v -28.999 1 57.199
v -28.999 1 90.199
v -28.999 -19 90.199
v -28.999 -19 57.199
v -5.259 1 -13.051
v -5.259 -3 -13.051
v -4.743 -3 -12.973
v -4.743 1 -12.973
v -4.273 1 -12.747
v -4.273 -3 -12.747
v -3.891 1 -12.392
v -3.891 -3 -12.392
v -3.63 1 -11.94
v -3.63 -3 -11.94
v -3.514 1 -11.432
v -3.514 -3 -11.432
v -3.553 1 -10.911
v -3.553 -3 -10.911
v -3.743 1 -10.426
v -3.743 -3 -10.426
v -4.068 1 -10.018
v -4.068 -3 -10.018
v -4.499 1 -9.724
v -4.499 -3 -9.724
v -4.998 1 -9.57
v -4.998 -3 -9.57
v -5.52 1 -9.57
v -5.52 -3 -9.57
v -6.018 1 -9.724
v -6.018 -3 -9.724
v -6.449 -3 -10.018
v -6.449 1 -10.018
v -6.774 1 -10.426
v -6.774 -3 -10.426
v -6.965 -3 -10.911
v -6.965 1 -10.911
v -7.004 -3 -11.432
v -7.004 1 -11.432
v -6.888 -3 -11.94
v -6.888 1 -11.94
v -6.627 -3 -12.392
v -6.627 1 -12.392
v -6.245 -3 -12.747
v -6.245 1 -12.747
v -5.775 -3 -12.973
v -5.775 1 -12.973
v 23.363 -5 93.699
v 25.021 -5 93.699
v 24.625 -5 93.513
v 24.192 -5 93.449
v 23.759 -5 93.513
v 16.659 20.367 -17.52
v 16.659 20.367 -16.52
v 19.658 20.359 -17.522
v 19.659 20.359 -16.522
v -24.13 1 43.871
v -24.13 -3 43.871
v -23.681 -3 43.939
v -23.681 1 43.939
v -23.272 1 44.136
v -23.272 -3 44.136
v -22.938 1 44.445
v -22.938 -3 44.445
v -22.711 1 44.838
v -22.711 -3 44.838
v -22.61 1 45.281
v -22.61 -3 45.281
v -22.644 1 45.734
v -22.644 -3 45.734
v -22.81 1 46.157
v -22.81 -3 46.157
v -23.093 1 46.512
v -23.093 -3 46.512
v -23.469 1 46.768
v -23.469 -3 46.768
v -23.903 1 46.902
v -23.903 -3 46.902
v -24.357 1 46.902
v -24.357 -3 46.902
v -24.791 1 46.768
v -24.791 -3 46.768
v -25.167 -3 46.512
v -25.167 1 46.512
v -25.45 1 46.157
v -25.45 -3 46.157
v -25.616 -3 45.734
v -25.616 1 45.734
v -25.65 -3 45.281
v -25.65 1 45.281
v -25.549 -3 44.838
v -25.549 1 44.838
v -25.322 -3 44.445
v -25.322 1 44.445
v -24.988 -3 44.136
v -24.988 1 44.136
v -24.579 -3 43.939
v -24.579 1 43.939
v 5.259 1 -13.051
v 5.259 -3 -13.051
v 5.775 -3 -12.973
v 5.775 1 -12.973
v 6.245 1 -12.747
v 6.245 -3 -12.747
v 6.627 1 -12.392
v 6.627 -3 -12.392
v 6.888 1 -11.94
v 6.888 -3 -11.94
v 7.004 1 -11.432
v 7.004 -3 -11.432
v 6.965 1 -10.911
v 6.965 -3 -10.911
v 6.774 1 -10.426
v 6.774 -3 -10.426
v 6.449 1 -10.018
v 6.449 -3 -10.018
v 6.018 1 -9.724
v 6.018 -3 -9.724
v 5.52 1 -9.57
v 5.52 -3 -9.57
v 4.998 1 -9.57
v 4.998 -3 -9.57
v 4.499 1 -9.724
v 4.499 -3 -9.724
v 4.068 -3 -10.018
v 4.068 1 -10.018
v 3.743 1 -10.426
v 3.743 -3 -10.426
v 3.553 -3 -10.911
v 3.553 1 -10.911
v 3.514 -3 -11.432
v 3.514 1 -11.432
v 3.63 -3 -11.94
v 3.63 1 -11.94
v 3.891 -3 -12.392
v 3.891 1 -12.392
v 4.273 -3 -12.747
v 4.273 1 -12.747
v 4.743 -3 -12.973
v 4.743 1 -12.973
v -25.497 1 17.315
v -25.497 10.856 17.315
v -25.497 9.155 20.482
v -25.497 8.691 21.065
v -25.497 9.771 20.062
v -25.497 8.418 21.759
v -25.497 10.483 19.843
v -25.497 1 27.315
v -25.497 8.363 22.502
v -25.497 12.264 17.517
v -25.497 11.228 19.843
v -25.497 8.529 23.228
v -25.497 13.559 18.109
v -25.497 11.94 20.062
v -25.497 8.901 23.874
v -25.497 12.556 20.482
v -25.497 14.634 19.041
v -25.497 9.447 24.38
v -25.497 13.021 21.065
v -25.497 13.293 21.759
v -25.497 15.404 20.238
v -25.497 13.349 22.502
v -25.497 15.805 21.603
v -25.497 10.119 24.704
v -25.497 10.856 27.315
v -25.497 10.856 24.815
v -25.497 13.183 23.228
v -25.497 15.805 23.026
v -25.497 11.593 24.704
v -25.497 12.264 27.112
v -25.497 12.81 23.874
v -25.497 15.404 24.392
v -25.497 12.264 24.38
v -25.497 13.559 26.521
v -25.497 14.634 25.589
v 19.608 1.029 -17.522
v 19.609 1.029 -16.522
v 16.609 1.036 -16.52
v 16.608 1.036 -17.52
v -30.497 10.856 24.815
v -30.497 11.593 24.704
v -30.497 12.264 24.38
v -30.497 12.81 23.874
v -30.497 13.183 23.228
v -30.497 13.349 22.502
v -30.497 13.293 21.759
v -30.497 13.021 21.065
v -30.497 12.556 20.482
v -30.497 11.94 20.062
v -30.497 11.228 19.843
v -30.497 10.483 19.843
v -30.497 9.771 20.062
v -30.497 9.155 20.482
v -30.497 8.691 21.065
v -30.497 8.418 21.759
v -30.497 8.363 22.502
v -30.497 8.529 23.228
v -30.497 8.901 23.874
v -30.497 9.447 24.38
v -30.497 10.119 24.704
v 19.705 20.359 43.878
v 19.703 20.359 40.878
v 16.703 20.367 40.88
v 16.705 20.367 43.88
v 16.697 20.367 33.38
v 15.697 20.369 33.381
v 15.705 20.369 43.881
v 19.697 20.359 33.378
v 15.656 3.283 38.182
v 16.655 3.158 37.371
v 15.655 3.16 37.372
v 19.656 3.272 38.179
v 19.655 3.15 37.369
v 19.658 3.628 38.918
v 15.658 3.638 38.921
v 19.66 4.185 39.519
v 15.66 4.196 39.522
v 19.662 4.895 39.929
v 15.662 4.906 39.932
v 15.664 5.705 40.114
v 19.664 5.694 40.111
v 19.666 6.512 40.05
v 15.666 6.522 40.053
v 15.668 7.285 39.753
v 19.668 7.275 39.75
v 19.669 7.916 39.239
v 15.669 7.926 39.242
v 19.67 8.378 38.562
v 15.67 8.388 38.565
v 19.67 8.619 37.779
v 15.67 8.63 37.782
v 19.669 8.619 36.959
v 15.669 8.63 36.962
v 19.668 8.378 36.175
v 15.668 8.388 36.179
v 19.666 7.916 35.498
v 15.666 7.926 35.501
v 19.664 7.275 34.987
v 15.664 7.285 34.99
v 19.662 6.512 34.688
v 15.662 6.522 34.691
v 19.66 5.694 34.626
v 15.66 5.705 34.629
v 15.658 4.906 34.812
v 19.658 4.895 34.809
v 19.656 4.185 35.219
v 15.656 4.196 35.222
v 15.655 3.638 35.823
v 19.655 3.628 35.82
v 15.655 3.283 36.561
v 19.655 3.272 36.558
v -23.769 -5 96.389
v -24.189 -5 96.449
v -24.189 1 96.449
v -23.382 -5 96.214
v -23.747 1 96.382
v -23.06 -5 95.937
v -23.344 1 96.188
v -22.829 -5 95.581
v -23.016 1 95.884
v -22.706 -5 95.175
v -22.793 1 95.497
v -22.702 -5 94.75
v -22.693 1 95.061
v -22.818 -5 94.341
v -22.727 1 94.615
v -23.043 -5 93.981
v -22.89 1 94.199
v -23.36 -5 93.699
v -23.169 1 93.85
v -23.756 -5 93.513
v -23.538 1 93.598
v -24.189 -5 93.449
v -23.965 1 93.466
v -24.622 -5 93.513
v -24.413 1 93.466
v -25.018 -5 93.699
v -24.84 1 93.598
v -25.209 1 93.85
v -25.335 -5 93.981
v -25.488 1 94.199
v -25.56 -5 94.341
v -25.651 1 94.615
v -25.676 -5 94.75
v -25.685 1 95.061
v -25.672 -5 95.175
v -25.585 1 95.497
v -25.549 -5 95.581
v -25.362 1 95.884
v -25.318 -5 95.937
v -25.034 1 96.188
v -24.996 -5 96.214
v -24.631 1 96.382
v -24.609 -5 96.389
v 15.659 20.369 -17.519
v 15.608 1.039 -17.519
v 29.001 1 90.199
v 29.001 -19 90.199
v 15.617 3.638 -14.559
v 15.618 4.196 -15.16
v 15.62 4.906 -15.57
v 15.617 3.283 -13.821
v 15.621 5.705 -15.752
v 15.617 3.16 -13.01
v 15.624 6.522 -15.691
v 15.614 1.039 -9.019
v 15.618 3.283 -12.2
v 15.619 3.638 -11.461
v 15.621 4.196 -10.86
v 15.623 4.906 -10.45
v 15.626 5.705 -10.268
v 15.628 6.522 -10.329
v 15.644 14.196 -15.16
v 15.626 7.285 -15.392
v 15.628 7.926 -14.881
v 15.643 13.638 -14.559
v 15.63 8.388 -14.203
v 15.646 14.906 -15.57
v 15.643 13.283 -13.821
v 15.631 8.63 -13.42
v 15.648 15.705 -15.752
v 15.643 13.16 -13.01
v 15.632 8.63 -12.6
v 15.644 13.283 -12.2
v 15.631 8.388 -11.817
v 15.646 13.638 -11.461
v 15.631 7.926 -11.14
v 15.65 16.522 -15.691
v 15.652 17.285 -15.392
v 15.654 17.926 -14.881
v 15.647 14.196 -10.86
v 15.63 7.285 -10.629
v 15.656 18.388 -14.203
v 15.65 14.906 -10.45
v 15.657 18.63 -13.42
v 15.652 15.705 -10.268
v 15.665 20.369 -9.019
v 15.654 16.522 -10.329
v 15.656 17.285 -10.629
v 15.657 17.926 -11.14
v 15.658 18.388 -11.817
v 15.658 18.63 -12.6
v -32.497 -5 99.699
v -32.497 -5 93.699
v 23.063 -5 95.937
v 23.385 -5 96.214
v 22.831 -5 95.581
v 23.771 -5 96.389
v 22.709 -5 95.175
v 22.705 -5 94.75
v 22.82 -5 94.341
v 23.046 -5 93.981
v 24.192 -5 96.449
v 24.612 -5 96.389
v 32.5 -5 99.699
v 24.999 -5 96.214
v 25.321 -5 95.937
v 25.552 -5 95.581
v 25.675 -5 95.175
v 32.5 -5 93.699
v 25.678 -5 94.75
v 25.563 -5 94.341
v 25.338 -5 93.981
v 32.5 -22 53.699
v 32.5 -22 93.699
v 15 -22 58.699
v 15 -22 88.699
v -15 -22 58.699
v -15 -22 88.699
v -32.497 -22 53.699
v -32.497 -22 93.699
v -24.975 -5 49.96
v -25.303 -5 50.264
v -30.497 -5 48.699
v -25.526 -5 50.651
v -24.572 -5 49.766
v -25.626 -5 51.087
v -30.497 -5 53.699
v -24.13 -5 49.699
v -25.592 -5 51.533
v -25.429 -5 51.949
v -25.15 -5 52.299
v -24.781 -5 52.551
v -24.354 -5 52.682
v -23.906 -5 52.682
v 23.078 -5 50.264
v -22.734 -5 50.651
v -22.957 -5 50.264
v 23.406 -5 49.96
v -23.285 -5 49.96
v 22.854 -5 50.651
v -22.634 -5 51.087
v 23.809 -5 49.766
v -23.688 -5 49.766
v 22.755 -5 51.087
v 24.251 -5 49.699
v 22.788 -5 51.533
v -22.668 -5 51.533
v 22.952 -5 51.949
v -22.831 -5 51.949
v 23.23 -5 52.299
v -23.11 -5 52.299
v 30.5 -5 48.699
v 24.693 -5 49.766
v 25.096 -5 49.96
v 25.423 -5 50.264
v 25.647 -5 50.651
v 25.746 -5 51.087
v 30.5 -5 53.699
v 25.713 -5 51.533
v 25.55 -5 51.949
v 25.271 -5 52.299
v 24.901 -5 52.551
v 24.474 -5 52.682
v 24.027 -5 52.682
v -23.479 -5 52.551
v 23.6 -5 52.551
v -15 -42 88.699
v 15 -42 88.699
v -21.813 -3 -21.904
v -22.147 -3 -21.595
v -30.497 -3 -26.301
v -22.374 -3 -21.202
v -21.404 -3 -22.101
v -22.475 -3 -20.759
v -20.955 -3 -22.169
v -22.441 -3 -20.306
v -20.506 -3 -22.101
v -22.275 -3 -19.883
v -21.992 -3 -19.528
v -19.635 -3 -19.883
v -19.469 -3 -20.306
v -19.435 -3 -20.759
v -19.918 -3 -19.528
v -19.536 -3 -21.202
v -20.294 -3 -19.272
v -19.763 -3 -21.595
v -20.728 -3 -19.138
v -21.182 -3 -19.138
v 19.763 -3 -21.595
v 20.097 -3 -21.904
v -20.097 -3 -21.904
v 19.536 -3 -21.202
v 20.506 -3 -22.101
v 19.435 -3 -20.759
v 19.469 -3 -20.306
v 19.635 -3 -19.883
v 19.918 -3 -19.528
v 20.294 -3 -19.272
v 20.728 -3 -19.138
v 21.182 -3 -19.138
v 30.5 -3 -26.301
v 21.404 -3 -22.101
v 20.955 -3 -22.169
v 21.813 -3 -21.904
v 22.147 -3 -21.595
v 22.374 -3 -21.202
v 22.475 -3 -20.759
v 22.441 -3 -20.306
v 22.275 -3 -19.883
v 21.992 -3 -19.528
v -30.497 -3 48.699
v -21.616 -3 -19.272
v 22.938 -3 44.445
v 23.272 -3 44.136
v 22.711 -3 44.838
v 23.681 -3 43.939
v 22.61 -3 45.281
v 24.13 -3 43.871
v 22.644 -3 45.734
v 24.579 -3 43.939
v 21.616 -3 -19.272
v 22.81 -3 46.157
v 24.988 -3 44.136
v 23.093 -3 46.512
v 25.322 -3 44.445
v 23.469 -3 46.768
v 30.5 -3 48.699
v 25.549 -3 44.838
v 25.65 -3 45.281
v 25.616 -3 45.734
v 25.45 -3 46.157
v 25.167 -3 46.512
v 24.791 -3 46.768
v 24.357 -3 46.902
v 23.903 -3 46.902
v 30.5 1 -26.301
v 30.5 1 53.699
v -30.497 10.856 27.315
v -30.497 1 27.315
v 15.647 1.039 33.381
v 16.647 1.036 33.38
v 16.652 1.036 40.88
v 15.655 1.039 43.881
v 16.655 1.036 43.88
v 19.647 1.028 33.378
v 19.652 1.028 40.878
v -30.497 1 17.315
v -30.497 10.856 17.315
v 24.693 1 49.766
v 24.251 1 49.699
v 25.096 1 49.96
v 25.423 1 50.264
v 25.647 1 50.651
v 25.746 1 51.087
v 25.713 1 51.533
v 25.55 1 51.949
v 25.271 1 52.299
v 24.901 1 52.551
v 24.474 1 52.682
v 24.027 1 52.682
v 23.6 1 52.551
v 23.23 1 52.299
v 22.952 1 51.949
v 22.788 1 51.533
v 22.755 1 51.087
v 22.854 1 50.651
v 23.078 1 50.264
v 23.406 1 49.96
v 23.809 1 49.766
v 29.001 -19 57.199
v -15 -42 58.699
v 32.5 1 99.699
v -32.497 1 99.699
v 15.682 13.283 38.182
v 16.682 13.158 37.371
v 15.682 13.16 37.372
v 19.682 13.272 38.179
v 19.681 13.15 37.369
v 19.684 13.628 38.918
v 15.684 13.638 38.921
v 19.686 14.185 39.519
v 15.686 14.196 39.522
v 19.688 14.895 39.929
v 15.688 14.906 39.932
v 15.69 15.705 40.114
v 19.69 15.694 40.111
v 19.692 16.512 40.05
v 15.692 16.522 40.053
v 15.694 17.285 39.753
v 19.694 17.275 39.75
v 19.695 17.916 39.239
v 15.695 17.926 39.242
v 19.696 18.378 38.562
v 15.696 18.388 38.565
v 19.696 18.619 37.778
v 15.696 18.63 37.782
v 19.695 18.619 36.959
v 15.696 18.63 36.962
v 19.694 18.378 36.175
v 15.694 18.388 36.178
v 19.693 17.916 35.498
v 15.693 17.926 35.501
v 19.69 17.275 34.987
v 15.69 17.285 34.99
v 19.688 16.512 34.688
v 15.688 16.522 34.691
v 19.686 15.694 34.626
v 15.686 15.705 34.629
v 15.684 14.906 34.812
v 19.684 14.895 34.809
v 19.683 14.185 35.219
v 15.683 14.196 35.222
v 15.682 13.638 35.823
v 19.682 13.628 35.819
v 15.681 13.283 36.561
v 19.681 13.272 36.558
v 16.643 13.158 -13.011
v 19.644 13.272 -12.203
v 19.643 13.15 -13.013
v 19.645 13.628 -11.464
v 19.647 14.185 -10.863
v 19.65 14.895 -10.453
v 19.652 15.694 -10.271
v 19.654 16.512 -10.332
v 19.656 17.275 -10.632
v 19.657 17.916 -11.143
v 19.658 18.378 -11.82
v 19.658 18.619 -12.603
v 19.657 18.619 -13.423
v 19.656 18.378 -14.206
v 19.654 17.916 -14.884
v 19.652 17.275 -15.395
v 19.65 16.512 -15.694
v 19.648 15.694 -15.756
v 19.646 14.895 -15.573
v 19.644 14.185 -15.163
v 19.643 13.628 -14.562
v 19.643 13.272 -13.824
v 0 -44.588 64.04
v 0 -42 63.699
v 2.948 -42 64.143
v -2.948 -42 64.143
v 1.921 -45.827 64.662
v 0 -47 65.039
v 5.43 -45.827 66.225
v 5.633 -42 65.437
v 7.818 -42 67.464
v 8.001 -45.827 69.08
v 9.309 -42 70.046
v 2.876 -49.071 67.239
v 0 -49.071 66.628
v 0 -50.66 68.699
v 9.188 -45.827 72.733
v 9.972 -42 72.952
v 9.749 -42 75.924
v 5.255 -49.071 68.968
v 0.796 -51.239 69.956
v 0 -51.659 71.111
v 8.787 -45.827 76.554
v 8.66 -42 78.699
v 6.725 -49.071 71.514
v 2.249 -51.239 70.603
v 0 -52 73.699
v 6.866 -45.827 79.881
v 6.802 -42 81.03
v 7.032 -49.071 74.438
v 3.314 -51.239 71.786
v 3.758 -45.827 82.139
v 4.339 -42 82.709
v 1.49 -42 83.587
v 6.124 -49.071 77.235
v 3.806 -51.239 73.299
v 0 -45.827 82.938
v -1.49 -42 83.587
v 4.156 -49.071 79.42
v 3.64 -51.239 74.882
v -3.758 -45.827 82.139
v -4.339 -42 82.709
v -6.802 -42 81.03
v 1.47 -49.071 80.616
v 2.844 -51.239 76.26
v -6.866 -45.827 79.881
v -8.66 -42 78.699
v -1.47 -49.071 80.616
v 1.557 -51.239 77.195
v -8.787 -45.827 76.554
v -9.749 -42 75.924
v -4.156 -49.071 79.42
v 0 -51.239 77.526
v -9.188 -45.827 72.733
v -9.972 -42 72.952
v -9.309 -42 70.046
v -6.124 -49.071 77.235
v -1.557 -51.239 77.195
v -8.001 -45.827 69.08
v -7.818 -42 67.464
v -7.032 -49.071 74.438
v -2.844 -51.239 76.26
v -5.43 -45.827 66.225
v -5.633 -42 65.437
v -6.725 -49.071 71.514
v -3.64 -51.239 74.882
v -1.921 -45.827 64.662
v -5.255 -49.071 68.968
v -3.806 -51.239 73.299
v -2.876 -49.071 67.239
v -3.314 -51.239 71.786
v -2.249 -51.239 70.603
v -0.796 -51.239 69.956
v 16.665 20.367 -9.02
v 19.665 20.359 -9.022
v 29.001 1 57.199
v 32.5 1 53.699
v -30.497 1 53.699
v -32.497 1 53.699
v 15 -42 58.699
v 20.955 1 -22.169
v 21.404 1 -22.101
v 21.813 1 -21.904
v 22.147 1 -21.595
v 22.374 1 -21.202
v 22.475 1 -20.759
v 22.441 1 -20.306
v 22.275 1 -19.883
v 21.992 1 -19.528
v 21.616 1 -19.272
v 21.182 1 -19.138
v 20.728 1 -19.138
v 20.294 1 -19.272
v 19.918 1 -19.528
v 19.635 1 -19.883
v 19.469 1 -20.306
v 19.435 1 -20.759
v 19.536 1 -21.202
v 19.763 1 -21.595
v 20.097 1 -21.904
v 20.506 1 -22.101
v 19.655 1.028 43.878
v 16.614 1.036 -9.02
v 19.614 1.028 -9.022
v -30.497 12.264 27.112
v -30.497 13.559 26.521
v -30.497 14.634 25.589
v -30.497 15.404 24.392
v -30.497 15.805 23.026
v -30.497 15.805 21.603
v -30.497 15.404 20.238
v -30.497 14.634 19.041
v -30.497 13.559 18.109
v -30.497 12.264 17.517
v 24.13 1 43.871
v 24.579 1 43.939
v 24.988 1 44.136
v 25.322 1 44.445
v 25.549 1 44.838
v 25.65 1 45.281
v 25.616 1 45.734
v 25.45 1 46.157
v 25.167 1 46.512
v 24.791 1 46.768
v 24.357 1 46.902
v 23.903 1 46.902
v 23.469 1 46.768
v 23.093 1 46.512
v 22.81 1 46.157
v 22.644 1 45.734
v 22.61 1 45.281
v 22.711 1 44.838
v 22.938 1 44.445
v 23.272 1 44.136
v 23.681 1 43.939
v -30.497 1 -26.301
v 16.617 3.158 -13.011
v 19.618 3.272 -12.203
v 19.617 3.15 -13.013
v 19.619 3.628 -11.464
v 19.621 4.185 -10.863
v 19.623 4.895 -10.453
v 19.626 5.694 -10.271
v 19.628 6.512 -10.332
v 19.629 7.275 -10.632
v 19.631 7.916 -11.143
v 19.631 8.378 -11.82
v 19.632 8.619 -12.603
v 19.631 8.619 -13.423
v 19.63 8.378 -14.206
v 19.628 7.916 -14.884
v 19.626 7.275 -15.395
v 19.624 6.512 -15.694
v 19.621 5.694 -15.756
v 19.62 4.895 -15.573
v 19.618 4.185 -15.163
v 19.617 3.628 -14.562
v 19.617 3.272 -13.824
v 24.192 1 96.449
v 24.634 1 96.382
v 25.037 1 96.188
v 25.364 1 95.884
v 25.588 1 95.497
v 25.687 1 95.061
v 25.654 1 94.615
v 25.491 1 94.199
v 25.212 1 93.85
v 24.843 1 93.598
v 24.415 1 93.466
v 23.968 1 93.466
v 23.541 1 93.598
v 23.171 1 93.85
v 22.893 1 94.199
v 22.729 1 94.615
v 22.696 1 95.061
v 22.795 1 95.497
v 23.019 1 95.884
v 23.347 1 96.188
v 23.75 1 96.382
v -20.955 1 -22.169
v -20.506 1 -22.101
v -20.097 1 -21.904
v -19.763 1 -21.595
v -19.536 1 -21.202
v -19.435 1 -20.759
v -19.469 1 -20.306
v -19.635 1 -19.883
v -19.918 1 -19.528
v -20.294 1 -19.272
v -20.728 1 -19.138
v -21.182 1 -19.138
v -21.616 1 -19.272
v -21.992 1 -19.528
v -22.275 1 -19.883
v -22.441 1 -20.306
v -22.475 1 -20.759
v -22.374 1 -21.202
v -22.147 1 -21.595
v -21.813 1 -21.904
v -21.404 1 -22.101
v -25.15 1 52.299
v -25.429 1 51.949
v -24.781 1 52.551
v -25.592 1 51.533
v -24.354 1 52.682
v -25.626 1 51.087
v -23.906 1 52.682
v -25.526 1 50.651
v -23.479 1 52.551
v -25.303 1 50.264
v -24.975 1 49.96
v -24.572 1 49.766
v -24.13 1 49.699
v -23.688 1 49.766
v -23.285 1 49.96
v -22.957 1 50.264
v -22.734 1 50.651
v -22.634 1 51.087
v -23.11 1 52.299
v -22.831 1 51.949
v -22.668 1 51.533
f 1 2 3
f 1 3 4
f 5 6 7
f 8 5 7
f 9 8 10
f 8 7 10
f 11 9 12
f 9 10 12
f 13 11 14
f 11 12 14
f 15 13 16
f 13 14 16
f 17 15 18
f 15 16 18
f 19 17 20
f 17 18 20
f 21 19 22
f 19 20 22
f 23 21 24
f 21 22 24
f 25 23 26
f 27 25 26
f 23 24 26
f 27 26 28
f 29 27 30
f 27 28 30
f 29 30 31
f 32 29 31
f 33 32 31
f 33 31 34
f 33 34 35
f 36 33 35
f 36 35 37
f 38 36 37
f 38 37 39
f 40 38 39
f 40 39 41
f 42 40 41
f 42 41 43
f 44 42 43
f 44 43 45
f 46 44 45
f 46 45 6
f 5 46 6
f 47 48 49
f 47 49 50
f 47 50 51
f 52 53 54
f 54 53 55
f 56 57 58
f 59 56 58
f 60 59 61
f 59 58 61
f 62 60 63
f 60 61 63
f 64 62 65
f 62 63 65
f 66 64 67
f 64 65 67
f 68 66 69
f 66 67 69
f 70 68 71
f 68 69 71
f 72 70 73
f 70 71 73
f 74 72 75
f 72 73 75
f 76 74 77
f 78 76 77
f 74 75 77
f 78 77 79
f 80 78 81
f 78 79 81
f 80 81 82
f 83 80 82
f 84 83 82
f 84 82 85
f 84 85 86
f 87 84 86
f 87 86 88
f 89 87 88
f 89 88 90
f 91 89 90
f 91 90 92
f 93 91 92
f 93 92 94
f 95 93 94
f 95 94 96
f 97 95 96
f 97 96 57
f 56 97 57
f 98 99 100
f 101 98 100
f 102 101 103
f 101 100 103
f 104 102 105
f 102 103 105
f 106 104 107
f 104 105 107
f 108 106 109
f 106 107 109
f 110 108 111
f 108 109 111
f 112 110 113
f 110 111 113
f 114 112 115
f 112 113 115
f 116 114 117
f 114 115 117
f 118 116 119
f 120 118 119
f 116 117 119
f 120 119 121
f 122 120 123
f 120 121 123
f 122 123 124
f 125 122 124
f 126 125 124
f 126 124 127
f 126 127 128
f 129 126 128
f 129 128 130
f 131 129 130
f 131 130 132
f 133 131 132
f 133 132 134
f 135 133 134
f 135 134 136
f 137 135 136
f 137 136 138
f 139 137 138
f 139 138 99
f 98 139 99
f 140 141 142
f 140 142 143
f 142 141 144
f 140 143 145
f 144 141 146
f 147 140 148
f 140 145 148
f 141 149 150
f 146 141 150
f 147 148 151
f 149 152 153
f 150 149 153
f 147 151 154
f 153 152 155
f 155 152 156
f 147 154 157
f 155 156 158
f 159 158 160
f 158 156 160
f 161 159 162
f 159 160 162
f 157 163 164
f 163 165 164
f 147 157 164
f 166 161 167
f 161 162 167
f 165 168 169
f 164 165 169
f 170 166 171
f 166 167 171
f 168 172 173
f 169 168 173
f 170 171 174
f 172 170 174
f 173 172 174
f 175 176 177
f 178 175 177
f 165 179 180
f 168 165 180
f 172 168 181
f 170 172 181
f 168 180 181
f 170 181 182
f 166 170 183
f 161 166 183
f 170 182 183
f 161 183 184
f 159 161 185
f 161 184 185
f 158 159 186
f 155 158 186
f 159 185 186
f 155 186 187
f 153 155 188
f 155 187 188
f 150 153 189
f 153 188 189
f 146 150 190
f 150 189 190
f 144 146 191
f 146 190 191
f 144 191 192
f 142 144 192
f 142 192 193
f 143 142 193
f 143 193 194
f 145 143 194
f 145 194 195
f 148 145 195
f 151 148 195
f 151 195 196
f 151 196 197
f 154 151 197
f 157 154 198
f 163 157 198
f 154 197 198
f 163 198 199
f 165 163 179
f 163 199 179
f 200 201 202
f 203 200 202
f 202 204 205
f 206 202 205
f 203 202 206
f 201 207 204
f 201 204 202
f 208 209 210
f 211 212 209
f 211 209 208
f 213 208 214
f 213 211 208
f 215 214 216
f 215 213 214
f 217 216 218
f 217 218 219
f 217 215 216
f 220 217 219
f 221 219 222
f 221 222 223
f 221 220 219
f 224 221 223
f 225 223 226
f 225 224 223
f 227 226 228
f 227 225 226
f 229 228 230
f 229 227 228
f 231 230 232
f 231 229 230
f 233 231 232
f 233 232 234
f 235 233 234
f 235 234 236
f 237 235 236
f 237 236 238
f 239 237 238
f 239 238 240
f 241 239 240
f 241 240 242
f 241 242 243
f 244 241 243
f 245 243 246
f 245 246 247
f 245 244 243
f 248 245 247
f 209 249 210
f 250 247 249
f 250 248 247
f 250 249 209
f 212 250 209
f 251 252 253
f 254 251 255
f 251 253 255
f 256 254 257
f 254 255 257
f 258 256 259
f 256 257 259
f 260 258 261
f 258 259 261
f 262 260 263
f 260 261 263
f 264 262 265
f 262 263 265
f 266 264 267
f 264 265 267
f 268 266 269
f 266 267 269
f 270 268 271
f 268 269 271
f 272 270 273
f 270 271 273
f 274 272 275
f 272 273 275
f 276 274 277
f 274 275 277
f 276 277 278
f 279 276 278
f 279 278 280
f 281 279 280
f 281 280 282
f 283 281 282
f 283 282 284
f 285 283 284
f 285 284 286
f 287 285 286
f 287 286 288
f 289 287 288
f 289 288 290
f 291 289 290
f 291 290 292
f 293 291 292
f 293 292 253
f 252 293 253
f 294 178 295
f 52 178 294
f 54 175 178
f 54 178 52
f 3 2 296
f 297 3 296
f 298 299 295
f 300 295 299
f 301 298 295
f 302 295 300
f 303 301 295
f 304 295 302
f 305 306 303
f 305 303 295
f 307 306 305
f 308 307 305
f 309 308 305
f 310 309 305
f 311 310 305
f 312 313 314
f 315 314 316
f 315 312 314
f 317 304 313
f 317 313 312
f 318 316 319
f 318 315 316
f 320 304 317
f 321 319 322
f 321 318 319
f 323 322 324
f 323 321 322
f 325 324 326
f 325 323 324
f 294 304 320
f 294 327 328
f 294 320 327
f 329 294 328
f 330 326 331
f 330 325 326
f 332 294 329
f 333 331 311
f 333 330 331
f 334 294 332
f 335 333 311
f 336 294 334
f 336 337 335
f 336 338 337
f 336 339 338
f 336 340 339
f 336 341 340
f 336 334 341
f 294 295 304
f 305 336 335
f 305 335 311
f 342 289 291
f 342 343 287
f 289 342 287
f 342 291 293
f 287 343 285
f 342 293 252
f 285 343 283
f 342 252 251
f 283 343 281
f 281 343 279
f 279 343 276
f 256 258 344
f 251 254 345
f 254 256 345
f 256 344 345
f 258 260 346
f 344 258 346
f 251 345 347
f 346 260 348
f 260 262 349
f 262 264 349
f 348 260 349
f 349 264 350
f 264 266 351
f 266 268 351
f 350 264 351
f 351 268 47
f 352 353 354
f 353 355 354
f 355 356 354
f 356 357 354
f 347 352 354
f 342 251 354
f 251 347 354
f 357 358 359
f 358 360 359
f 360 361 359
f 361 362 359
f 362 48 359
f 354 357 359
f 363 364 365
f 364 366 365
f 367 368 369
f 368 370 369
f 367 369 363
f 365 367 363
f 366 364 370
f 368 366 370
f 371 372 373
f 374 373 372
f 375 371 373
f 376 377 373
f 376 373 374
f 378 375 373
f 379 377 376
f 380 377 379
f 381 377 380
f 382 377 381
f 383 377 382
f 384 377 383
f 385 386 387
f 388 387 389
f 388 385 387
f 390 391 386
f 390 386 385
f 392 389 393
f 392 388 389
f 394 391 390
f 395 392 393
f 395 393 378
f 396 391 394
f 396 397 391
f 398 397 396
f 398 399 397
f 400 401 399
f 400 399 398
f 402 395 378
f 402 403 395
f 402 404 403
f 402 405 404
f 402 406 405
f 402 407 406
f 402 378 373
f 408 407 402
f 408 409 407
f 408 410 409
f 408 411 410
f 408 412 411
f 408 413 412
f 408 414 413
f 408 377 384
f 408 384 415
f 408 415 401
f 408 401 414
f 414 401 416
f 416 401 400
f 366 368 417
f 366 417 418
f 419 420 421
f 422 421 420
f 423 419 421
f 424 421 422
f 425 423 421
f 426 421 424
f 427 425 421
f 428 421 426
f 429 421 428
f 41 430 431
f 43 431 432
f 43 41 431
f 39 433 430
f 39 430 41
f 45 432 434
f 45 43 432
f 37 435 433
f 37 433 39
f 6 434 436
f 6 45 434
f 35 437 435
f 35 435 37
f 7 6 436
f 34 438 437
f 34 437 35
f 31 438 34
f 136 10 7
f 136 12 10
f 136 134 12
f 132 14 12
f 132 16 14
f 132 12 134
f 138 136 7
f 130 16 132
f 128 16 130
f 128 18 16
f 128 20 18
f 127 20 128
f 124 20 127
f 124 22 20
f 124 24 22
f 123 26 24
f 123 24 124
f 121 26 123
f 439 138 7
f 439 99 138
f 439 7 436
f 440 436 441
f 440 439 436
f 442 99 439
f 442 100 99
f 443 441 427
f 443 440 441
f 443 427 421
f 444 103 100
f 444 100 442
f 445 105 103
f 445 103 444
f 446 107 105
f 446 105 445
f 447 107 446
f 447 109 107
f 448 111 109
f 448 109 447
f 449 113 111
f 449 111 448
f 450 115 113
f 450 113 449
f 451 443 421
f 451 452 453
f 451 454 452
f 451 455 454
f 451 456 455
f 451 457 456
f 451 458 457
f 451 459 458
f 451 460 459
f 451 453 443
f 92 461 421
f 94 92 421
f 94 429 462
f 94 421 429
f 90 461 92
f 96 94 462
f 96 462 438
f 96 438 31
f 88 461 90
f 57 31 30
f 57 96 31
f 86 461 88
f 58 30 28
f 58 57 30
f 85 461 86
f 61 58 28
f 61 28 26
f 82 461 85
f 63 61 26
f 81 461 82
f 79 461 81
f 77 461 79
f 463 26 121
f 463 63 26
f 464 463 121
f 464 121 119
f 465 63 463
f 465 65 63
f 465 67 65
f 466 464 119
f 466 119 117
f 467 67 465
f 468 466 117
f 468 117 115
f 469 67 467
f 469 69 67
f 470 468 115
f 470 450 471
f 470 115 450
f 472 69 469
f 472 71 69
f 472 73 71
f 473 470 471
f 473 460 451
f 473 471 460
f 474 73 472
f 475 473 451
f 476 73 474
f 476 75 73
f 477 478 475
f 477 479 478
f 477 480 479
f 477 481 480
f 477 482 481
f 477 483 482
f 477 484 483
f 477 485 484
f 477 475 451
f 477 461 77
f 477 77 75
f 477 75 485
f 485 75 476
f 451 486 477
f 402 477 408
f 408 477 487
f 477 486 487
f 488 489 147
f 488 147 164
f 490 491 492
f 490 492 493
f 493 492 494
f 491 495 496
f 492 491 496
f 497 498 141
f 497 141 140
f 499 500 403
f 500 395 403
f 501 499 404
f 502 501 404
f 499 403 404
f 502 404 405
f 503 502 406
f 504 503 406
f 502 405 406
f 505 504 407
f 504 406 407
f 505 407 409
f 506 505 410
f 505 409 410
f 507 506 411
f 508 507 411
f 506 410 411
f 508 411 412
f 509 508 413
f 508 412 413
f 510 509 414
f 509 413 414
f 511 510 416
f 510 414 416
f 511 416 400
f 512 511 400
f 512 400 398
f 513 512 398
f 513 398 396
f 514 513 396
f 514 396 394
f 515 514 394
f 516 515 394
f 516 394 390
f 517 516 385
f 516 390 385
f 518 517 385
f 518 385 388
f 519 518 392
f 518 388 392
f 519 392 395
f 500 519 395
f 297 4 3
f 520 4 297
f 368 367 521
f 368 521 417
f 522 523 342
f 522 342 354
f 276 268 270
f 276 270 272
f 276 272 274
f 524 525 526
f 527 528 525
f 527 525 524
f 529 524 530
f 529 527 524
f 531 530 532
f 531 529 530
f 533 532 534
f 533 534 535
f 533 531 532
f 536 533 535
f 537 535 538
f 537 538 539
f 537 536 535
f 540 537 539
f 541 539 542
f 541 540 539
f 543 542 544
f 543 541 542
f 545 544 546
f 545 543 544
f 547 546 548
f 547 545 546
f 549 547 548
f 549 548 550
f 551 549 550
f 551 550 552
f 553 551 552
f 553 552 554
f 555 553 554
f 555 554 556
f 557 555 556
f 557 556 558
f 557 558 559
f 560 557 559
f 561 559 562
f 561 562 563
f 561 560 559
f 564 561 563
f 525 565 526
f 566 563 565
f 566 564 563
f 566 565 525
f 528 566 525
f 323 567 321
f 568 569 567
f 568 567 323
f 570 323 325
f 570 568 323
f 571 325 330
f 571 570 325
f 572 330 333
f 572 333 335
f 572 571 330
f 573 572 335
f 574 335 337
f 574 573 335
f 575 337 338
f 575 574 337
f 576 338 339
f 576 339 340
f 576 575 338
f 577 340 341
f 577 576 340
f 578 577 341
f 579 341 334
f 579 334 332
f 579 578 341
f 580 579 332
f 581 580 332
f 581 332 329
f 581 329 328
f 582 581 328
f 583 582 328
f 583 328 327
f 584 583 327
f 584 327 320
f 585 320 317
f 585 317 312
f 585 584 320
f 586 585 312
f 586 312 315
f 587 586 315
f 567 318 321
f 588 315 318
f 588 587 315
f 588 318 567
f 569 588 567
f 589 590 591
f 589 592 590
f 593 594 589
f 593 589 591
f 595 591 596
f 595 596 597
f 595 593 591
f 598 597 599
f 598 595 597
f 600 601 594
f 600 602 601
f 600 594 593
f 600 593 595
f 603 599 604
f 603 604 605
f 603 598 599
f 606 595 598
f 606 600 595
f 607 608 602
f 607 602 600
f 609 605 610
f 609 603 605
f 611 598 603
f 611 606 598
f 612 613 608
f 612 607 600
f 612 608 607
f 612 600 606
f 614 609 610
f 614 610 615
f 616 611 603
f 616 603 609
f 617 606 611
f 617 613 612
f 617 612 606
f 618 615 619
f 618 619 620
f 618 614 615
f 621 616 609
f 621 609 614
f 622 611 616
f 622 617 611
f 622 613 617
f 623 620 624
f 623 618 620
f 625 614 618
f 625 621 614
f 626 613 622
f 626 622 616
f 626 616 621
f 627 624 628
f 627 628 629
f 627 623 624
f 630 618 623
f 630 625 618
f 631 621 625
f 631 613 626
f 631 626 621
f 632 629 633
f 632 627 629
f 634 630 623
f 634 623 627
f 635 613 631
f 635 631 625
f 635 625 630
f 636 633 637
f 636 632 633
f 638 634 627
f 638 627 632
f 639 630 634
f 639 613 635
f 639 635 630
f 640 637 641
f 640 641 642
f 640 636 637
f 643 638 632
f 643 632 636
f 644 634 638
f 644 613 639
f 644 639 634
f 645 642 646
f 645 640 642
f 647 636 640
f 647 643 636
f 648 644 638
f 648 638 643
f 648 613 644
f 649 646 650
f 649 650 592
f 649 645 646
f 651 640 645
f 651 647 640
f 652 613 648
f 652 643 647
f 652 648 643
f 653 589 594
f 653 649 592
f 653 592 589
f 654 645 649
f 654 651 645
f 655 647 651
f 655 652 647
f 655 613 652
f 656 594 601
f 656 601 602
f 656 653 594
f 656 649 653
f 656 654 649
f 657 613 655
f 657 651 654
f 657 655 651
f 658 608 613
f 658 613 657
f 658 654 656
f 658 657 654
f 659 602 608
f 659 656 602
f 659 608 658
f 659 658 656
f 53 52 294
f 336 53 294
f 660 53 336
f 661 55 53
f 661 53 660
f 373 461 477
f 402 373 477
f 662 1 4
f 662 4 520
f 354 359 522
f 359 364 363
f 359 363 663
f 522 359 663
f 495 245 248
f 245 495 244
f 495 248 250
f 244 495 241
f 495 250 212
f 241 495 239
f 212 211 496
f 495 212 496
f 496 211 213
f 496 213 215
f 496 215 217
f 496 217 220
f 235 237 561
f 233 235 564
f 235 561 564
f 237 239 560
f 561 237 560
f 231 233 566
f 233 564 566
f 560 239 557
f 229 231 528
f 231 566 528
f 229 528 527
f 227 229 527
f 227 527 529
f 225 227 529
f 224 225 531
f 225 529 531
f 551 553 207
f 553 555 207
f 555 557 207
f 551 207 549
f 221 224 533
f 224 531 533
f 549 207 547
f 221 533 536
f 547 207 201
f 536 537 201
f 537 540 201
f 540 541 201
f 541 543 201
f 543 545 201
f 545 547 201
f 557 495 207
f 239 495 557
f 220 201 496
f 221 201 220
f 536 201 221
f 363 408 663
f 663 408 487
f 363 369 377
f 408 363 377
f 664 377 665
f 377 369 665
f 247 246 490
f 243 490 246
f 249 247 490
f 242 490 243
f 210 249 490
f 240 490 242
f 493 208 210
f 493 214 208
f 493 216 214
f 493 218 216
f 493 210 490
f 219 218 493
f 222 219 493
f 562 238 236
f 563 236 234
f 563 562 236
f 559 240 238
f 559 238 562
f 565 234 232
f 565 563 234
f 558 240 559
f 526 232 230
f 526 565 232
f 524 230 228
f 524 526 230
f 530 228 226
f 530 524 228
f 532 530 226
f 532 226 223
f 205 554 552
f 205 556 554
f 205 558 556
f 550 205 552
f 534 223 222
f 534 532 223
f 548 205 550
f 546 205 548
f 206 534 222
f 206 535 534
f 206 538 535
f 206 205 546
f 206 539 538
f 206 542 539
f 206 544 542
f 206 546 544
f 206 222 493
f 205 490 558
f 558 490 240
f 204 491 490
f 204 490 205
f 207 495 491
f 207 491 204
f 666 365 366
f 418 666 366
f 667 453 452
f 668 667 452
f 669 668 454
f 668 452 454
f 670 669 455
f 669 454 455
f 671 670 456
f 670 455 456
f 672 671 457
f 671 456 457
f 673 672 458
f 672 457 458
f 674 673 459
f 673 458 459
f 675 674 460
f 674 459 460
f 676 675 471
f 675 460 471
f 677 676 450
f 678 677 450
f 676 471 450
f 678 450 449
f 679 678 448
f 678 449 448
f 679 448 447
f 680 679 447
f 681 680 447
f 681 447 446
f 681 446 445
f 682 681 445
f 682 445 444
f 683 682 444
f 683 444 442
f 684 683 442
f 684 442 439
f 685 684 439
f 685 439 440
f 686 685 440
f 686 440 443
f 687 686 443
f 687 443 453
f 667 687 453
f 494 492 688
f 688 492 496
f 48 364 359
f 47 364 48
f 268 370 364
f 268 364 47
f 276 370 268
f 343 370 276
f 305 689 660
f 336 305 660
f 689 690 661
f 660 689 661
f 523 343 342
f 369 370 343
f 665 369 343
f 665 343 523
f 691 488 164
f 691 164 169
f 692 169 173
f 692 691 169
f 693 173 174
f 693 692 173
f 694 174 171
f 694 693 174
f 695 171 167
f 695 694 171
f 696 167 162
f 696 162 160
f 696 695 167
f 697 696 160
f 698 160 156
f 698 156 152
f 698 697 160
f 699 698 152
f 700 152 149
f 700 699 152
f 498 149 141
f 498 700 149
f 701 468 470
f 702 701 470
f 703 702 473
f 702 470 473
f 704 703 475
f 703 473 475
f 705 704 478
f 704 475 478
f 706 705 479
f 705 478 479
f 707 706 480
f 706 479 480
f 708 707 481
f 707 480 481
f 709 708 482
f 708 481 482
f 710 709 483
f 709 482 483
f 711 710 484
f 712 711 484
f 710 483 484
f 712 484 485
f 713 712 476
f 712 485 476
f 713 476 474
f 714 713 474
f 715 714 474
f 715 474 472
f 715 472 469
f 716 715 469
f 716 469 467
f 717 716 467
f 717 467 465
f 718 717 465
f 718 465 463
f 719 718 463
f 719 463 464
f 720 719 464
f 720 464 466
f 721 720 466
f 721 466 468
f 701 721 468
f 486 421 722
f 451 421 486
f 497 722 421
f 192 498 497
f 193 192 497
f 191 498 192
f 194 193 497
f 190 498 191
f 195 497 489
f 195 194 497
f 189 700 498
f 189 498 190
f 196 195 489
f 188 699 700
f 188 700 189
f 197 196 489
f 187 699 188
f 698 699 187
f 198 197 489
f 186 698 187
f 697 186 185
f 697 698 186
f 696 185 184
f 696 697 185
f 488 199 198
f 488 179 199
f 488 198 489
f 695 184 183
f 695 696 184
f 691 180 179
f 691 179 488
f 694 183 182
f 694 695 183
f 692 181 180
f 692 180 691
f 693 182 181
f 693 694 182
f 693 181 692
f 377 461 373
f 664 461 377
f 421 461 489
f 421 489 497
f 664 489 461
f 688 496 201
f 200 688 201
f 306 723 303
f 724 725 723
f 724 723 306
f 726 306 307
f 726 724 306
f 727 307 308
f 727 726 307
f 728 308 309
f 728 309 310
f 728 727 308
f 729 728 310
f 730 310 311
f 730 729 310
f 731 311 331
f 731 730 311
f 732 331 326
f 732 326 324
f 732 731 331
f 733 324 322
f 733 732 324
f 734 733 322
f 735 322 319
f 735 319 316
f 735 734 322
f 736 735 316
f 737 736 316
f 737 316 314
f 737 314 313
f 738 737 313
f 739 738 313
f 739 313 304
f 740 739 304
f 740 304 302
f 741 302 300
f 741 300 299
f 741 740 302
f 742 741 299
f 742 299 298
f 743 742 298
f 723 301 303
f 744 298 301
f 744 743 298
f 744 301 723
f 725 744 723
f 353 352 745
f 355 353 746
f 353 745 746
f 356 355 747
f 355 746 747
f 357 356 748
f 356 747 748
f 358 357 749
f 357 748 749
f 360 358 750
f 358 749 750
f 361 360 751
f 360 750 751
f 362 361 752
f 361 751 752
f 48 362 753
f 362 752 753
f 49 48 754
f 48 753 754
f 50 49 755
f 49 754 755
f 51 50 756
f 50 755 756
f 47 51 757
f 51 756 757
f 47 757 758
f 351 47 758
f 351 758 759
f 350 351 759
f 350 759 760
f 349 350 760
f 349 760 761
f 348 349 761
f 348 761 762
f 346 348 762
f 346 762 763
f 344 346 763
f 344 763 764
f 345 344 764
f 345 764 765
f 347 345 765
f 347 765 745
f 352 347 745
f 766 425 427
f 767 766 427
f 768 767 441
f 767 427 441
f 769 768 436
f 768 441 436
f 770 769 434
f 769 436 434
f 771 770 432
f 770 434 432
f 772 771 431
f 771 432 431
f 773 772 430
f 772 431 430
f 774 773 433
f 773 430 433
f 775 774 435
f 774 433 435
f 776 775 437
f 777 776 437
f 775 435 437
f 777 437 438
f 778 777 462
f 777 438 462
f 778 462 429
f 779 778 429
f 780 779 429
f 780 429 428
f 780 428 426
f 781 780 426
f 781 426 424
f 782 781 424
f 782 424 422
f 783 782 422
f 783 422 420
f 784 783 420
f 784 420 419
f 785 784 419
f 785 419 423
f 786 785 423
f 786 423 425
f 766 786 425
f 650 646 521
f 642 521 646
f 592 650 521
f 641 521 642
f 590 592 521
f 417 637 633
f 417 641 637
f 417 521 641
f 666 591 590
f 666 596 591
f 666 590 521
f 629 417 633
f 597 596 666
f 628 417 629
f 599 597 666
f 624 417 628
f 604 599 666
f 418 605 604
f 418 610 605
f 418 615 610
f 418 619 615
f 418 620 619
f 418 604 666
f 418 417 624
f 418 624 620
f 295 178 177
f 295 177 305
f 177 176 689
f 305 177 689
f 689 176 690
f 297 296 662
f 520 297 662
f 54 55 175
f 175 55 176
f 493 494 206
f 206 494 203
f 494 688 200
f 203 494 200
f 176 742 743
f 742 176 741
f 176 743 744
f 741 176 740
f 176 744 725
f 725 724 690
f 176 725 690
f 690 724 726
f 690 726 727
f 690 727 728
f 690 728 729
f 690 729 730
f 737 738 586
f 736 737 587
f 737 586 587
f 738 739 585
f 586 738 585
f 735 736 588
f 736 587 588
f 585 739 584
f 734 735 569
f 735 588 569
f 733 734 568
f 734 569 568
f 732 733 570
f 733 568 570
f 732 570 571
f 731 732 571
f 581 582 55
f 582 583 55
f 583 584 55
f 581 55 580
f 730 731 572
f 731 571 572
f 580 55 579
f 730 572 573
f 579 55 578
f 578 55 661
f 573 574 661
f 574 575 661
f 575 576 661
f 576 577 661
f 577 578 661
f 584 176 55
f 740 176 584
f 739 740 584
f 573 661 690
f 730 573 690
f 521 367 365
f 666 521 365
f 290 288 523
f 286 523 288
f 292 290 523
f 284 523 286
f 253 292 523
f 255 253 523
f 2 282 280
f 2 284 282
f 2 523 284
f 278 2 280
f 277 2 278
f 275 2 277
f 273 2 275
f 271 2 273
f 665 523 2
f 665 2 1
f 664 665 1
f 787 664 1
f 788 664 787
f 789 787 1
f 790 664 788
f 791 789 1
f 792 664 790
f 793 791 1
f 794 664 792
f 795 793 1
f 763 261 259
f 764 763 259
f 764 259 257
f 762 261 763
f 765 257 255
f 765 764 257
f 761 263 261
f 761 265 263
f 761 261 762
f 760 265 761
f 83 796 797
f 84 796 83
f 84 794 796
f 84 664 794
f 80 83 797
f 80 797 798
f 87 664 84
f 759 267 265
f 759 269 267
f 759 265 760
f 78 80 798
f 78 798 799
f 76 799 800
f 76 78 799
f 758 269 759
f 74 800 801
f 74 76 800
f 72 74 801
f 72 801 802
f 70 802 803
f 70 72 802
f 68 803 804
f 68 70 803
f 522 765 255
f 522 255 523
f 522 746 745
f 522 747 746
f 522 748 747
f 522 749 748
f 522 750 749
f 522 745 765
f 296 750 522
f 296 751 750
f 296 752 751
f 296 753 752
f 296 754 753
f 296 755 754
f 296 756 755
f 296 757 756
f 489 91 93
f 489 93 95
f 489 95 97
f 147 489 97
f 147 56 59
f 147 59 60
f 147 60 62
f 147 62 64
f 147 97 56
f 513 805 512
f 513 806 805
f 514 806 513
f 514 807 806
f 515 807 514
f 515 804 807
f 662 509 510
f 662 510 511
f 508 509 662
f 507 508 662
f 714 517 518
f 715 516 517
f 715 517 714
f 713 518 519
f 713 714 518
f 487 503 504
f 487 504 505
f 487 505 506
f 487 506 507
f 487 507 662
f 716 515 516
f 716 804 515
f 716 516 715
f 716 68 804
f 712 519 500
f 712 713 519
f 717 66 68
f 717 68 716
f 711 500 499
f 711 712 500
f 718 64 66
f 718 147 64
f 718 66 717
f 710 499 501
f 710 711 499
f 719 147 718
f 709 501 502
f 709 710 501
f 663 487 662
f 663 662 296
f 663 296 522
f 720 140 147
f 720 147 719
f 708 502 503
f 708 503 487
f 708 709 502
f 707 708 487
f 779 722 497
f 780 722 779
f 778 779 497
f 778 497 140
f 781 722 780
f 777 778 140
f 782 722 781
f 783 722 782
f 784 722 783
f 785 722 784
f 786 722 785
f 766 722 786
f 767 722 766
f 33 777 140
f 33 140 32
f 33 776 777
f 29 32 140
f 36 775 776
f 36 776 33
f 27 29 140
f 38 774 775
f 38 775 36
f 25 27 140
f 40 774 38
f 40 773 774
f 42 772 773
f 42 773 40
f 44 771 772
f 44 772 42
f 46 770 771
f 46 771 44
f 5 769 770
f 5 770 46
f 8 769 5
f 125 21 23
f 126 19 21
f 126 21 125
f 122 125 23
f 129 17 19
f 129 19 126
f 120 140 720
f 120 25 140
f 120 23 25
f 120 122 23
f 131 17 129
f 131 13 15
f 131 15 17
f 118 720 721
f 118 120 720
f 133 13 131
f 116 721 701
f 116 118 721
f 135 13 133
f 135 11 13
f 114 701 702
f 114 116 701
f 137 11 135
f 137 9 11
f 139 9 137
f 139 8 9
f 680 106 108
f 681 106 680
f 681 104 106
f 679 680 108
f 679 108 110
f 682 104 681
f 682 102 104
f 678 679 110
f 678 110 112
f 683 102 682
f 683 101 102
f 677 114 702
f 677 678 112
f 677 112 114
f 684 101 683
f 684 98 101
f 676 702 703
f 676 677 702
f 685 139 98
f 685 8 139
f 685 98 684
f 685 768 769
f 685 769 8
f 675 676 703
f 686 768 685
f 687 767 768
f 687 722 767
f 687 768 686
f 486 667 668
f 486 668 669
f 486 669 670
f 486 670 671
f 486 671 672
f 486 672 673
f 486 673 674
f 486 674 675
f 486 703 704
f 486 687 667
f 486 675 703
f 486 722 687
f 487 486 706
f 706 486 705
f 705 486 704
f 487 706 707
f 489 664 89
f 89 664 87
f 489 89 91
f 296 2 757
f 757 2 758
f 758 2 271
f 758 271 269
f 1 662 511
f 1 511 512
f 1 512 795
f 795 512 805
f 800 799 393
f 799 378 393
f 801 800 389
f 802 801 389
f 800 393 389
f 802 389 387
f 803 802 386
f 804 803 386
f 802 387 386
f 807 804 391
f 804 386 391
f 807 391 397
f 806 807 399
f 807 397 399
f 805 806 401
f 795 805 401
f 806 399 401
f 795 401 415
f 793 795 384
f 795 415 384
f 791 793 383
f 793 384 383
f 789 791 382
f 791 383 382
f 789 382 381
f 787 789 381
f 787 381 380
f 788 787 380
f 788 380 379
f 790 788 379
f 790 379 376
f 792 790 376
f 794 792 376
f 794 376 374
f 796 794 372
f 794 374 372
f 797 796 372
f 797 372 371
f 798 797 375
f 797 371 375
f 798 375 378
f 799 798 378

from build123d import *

# Parameters (mm, degrees)
SKETCH_1_W               = 60.99726579
SKETCH_1_H               = 80
EXTRUDE_1_DEPTH          = 1
SKETCH_2_R               = 1.524
CUT_EXTRUDE_1_DEPTH      = 1
SKETCH_3_W               = 1
SKETCH_3_H               = 21.992162459
EXTRUDE_2_DEPTH          = 22
SKETCH_7_W               = 7.5
SKETCH_7_H               = 19.330567091
SKETCH_7_R               = 2.75
EXTRUDE_3_DEPTH          = 3
SKETCH_7_H_2             = 19.330671724
EXTRUDE_3_2_DEPTH        = 3
SKETCH_8_R               = 2.5
EXTRUDE_4_DEPTH          = 5
SKETCH_12_W              = 2
SKETCH_12_H              = 21.992162459
EXTRUDE_5_DEPTH          = 22
CUT_EXTRUDE_3_DEPTH      = 72.341536493
CUT_EXTRUDE_3_DEPTH_BACK = 15
SKETCH_9_R               = 1.75
SKETCH_14_W              = 17.99726579
SKETCH_14_H              = 10.99608123
EXTRUDE_6_DEPTH          = 3
SKETCH_15_R              = 1.75
CUT_EXTRUDE_4_DEPTH      = 67.029179397
SKETCH_18_W              = 125.682596232
SKETCH_18_H              = 131.027051286
CUT_EXTRUDE_6_DEPTH      = 66.55792676
EXTRUDE_START            = 3
SKETCH_19_W              = 60.99726579
SKETCH_19_H              = 80
SKETCH_19_R              = 1.524
SKETCH_19_R_2            = 1.75
EXTRUDE_7_DEPTH          = 3
SKETCH_20_W              = 60.99726579
SKETCH_20_H              = 40
EXTRUDE_8_DEPTH          = 23
SKETCH_21_W              = 58
SKETCH_21_H              = 33
CUT_EXTRUDE_7_DEPTH      = 20
SKETCH_26_W              = 30
SKETCH_26_H              = 30
EXTRUDE_9_DEPTH          = 20
EXTRUDE_10_DEPTH         = 3
SKETCH_28_W              = 10.5
SKETCH_28_H              = 19.330671724
SKETCH_28_R              = 2.75
EXTRUDE_11_DEPTH         = 1
EXTRUDE_12_DEPTH         = 1
SKETCH_30_W              = 8.5
SKETCH_30_H              = 19.330567091
SKETCH_30_R              = 2.75
EXTRUDE_13_DEPTH         = 1
SKETCH_31_W              = 60.99726579
SKETCH_31_H              = 5
SKETCH_31_R              = 1.5
EXTRUDE_14_DEPTH         = 2
SKETCH_33_R              = 1.5
CUT_EXTRUDE_8_DEPTH      = 110.173112919
SKETCH_35_W              = 40
SKETCH_35_H              = 23
EXTRUDE_15_DEPTH         = 2
SKETCH_36_W              = 40
SKETCH_36_H              = 23
EXTRUDE_16_DEPTH         = 2
SKETCH_38_W              = 64.99726579
SKETCH_38_H              = 6
EXTRUDE_17_DEPTH         = 6
SKETCH_39_R              = 1.5
CUT_EXTRUDE_11_DEPTH     = 6


with BuildPart() as part:
    # 스케치1 → 보스-돌출1 (new body)
    with BuildSketch(Plane(origin=(0, 0, 0), x_dir=(1, 0, 0), z_dir=(0, 1, 0))):
        with Locations((0.001367105, -13.699085291)):
            Rectangle(SKETCH_1_W, SKETCH_1_H)
    extrude(amount=EXTRUDE_1_DEPTH)

    # 스케치2 → 컷-돌출1 (cut)
    with BuildSketch(Plane.XZ):
        with Locations(Location((-24.13, 45.395, 0), (0, 0, 270))):
            Circle(SKETCH_2_R)
        with Locations(Location((24.13, 45.395, 0), (0, 0, 270))):
            Circle(SKETCH_2_R)
        with Locations(Location((-20.955, -20.645, 0), (0, 0, 270))):
            Circle(SKETCH_2_R)
        with Locations(Location((20.955, -20.645, 0), (0, 0, 270))):
            Circle(SKETCH_2_R)
    extrude(amount=-CUT_EXTRUDE_1_DEPTH, mode=Mode.SUBTRACT)

    # 스케치3 → 보스-돌출2 (add)
    with BuildSketch(Plane.XZ):
        with Locations((-11.49726579, -15.30483348)):
            Rectangle(SKETCH_3_W, SKETCH_3_H)
        with Locations((11.5, -15.30483348)):
            Rectangle(SKETCH_3_W, SKETCH_3_H)
    extrude(amount=EXTRUDE_2_DEPTH)

    # 스케치8 → 보스-돌출4 (add)
    with BuildSketch(Plane.ZY.offset(30.49726579)):
        with BuildLine():
            Line((17.314820169, 10.855722027), (17.314820169, 1))
            Line((17.314820169, 1), (27.314820169, 1))
            Line((27.314820169, 1), (27.314820169, 10.855722027))
            ThreePointArc((27.314820169, 10.855722027), (22.314820169, 15.855722027), (17.314820169, 10.855722027))
        make_face()
        with Locations((22.314820169, 10.855722027)):
            Circle(SKETCH_8_R, mode=Mode.SUBTRACT)
    extrude(amount=-EXTRUDE_4_DEPTH)

    # 스케치12 → 보스-돌출5 (add)
    with BuildSketch(Plane.XZ):
        with Locations((-9.99726579, -15.30483348)):
            Rectangle(SKETCH_12_W, SKETCH_12_H)
        with Locations((10, -15.30483348)):
            Rectangle(SKETCH_12_W, SKETCH_12_H)
    extrude(amount=EXTRUDE_5_DEPTH)

    # 스케치9 → 컷-돌출3 (cut, two sides: drawn at the far end of the back side and taken through both)
    with BuildSketch(Plane.ZY.offset(-11).offset(-CUT_EXTRUDE_3_DEPTH_BACK)):
        with Locations(Location((-22.606276953, -2.5, 0), (0, 0, 180))):
            Circle(SKETCH_9_R)
        with Locations(Location((-22.606276953, -19.5, 0), (0, 0, 180))):
            Circle(SKETCH_9_R)
    extrude(amount=CUT_EXTRUDE_3_DEPTH + CUT_EXTRUDE_3_DEPTH_BACK, mode=Mode.SUBTRACT)

    # 스케치14 → 보스-돌출6 (add)
    with BuildSketch(Plane.XZ):
        with Locations((0.001367105, -9.806792865)):
            Rectangle(SKETCH_14_W, SKETCH_14_H)
    extrude(amount=EXTRUDE_6_DEPTH)

    # 스케치15 → 컷-돌출4 (cut, through all)
    with BuildSketch(Plane.XZ.offset(3)):
        with Locations(Location((-5.258745872, -11.300890987, 0), (0, 0, 270))):
            Circle(SKETCH_15_R)
        with Locations(Location((5.258745872, -11.300890987, 0), (0, 0, 270))):
            Circle(SKETCH_15_R)
    extrude(amount=-CUT_EXTRUDE_4_DEPTH, mode=Mode.SUBTRACT)

    # 스케치18 → 컷-돌출6 (cut, through all)
    with BuildSketch(Plane.XZ):
        with Locations((10.227533259, 5.024212254)):
            Rectangle(SKETCH_18_W, SKETCH_18_H)
    extrude(amount=CUT_EXTRUDE_6_DEPTH, mode=Mode.SUBTRACT)

    # 스케치19 → 보스-돌출7 (add)
    with BuildSketch(Plane.XZ.offset(EXTRUDE_START)):
        with Locations((0.001367105, 13.699085291)):
            Rectangle(SKETCH_19_W, SKETCH_19_H)
        with Locations(Location((-24.13, 45.395, 0), (0, 0, 270))):
            Circle(SKETCH_19_R, mode=Mode.SUBTRACT)
        with Locations(Location((24.13, 45.395, 0), (0, 0, 270))):
            Circle(SKETCH_19_R, mode=Mode.SUBTRACT)
        with Locations(Location((-5.258745872, -11.300890987, 0), (0, 0, 270))):
            Circle(SKETCH_19_R_2, mode=Mode.SUBTRACT)
        with Locations(Location((5.258745872, -11.300890987, 0), (0, 0, 270))):
            Circle(SKETCH_19_R_2, mode=Mode.SUBTRACT)
        with Locations(Location((-20.955, -20.645, 0), (0, 0, 270))):
            Circle(SKETCH_19_R, mode=Mode.SUBTRACT)
        with Locations(Location((20.955, -20.645, 0), (0, 0, 270))):
            Circle(SKETCH_19_R, mode=Mode.SUBTRACT)
    extrude(amount=-EXTRUDE_7_DEPTH)

    # 스케치20 → 보스-돌출8 (add)
    with BuildSketch(Plane(origin=(0, 1, 0), x_dir=(1, 0, 0), z_dir=(0, 1, 0))):
        with Locations((0.001367105, -73.699085291)):
            Rectangle(SKETCH_20_W, SKETCH_20_H)
    extrude(amount=-EXTRUDE_8_DEPTH)

    # 스케치21 → 컷-돌출7 (cut)
    with BuildSketch(Plane(origin=(0, 1, 0), x_dir=(1, 0, 0), z_dir=(0, 1, 0))):
        with Locations((0.001367105, -73.699085291)):
            Rectangle(SKETCH_21_W, SKETCH_21_H)
    extrude(amount=-CUT_EXTRUDE_7_DEPTH, mode=Mode.SUBTRACT)



with BuildPart() as body_2:
    # 스케치7 → 보스-돌출3 (new body)
    with BuildSketch(Plane(origin=(19.618416861, -0.051361028, -0.014963481), x_dir=(0.0007627207868309801, -1.996803493320823e-06, 0.9999997091264647), z_dir=(-0.9999962821814526, 0.002617990887417953, 0.0007627234006428938))):
        with Locations((-12.757304863, 10.745128864)):
            Rectangle(SKETCH_7_W, SKETCH_7_H)
        with Locations(Location((-12.998254061, 15.951338675, 0), (0, 0, 270))):
            Circle(SKETCH_7_R, mode=Mode.SUBTRACT)
        with Locations(Location((-12.998234093, 5.951338675, 0), (0, 0, 270))):
            Circle(SKETCH_7_R, mode=Mode.SUBTRACT)
    extrude(amount=EXTRUDE_3_DEPTH)

    # 스케치29 → 보스-돌출12 (add)
    with BuildSketch(Plane(origin=(-0.012590465, 3.2962e-05, -16.507300061), x_dir=(-0.9999997091284585, -1.523003974434168e-09, 0.0007627207868294601), z_dir=(-0.0007627207868309806, 1.996803493141394e-06, -0.9999997091264647))):
        Polygon((-19.671856873, 20.358981407), (-19.621249595, 1.02848056), (-16.621259875, 1.036334538), (-16.671867153, 20.366835384), align=None)
    extrude(amount=EXTRUDE_12_DEPTH)

    # 스케치30 → 보스-돌출13 (add)
    with BuildSketch(Plane(origin=(16.618428015, -0.043507055, -0.012675311), x_dir=(0.0007627207868311324, -1.996803493321271e-06, 0.9999997091264647), z_dir=(-0.9999962821814526, 0.002617990887418022, 0.0007627234006430462))):
        with Locations((-13.257304863, 10.745128864)):
            Rectangle(SKETCH_30_W, SKETCH_30_H)
        with Locations(Location((-12.998254061, 15.951338675, 0), (0, 0, 270))):
            Circle(SKETCH_30_R, mode=Mode.SUBTRACT)
        with Locations(Location((-12.998234093, 5.951338675, 0), (0, 0, 270))):
            Circle(SKETCH_30_R, mode=Mode.SUBTRACT)
    extrude(amount=EXTRUDE_13_DEPTH)


with BuildPart() as body_3:
    # 스케치7 → Extrude 3 2 (new body)
    with BuildSketch(Plane(origin=(19.618416861, -0.051361028, -0.014963481), x_dir=(0.0007627207868309801, -1.996803493320823e-06, 0.9999997091264647), z_dir=(-0.9999962821814526, 0.002617990887417953, 0.0007627234006428938))):
        with Locations((37.142697347, 10.74518118)):
            Rectangle(SKETCH_7_W, SKETCH_7_H_2)
        with Locations(Location((37.383594441, 15.951439278, 0), (0, 0, 270))):
            Circle(SKETCH_7_R, mode=Mode.SUBTRACT)
        with Locations(Location((37.383614409, 5.951439278, 0), (0, 0, 270))):
            Circle(SKETCH_7_R, mode=Mode.SUBTRACT)
    extrude(amount=EXTRUDE_3_2_DEPTH)

    # 스케치27 → 보스-돌출10 (add)
    with BuildSketch(Plane(origin=(0.03118971, -8.1655e-05, 40.892685452), x_dir=(0.9999997091284585, 1.5230039745710364e-09, -0.0007627207868294599), z_dir=(0.0007627207868309804, -1.9968034933208416e-06, 0.9999997091264647))):
        Polygon((19.621249595, 1.02848056), (19.671857146, 20.359086039), (16.671867427, 20.366940016), (16.621259875, 1.036334538), align=None)
    extrude(amount=EXTRUDE_10_DEPTH)

    # 스케치28 → 보스-돌출11 (add)
    with BuildSketch(Plane(origin=(16.618428015, -0.043507055, -0.012675311), x_dir=(0.00076272078683067, -1.996803493320029e-06, 0.9999997091264647), z_dir=(-0.9999962821814526, 0.002617990887417981, 0.0007627234006425838))):
        with Locations((38.642697347, 10.74518118)):
            Rectangle(SKETCH_28_W, SKETCH_28_H)
        with Locations(Location((37.383594441, 15.951439278, 0), (0, 0, 270))):
            Circle(SKETCH_28_R, mode=Mode.SUBTRACT)
        with Locations(Location((37.383614409, 5.951439278, 0), (0, 0, 270))):
            Circle(SKETCH_28_R, mode=Mode.SUBTRACT)
    extrude(amount=EXTRUDE_11_DEPTH)


with BuildPart() as body_4:
    # 스케치24 → 회전1 (revolve)
    with BuildSketch(Plane(origin=(0, 0, 0), x_dir=(0, 0, -1), z_dir=(1, 0, 0))):
        with BuildLine():
            Line((-73.699085291, -52), (-73.699085291, -42))
            Line((-73.699085291, -42), (-63.699085291, -42))
            ThreePointArc((-63.699085291, -42), (-66.628017479, -49.071067812), (-73.699085291, -52))
        make_face()
    revolve(axis=Axis((0, -22, 73.699085291), (0, -1, 0)))


with BuildPart() as part_1:
    add(part.part)

    add(body_4.part)  # 보스-돌출9 merges body 4
    # 스케치26 → 보스-돌출9 (add)
    with BuildSketch(Plane.XZ.offset(22)):
        with Locations((0, 73.699085291)):
            Rectangle(SKETCH_26_W, SKETCH_26_H)
    extrude(amount=EXTRUDE_9_DEPTH)

    # 스케치31 → 보스-돌출14 (add)
    with BuildSketch(Plane.XZ.offset(3)):
        with Locations((0.001367105, 51.199085291)):
            Rectangle(SKETCH_31_W, SKETCH_31_H)
        with Locations(Location((-24.13, 51.199085291, 0), (0, 0, 270))):
            Circle(SKETCH_31_R, mode=Mode.SUBTRACT)
        with Locations(Location((24.250641605, 51.199085291, 0), (0, 0, 270))):
            Circle(SKETCH_31_R, mode=Mode.SUBTRACT)
    extrude(amount=EXTRUDE_14_DEPTH)

    # 스케치33 → 컷-돌출8 (cut, through all)
    with BuildSketch(Plane.XZ.offset(5)):
        with Locations(Location((24.250641605, 51.199085291, 0), (0, 0, 270))):
            Circle(SKETCH_33_R)
        with Locations(Location((-24.13, 51.199085291, 0), (0, 0, 270))):
            Circle(SKETCH_33_R)
    extrude(amount=-CUT_EXTRUDE_8_DEPTH, mode=Mode.SUBTRACT)

    # 스케치35 → 보스-돌출15 (add)
    with BuildSketch(Plane.ZY.offset(30.49726579)):
        with Locations((73.699085291, -10.5)):
            Rectangle(SKETCH_35_W, SKETCH_35_H)
    extrude(amount=EXTRUDE_15_DEPTH)

    # 스케치36 → 보스-돌출16 (add)
    with BuildSketch(Plane(origin=(30.5, 0, 0), x_dir=(0, 0, -1), z_dir=(1, 0, 0))):
        with Locations((-73.699085291, -10.5)):
            Rectangle(SKETCH_36_W, SKETCH_36_H)
    extrude(amount=EXTRUDE_16_DEPTH)

    # 스케치38 → 보스-돌출17 (add)
    with BuildSketch(Plane.XY.offset(93.699085291)):
        with Locations((0.001367105, -2)):
            Rectangle(SKETCH_38_W, SKETCH_38_H)
    extrude(amount=EXTRUDE_17_DEPTH)

    # 스케치39 → 컷-돌출11 (cut)
    with BuildSketch(Plane(origin=(0, 1, 0), x_dir=(1, 0, 0), z_dir=(0, 1, 0))):
        with Locations(Location((-24.188953697, -94.949085291, 0), (0, 0, 270))):
            Circle(SKETCH_39_R)
        with Locations(Location((24.191687908, -94.949085291, 0), (0, 0, 270))):
            Circle(SKETCH_39_R)
    extrude(amount=-CUT_EXTRUDE_11_DEPTH, mode=Mode.SUBTRACT)


solid = Compound([body_2.part, body_3.part, part_1.part])
